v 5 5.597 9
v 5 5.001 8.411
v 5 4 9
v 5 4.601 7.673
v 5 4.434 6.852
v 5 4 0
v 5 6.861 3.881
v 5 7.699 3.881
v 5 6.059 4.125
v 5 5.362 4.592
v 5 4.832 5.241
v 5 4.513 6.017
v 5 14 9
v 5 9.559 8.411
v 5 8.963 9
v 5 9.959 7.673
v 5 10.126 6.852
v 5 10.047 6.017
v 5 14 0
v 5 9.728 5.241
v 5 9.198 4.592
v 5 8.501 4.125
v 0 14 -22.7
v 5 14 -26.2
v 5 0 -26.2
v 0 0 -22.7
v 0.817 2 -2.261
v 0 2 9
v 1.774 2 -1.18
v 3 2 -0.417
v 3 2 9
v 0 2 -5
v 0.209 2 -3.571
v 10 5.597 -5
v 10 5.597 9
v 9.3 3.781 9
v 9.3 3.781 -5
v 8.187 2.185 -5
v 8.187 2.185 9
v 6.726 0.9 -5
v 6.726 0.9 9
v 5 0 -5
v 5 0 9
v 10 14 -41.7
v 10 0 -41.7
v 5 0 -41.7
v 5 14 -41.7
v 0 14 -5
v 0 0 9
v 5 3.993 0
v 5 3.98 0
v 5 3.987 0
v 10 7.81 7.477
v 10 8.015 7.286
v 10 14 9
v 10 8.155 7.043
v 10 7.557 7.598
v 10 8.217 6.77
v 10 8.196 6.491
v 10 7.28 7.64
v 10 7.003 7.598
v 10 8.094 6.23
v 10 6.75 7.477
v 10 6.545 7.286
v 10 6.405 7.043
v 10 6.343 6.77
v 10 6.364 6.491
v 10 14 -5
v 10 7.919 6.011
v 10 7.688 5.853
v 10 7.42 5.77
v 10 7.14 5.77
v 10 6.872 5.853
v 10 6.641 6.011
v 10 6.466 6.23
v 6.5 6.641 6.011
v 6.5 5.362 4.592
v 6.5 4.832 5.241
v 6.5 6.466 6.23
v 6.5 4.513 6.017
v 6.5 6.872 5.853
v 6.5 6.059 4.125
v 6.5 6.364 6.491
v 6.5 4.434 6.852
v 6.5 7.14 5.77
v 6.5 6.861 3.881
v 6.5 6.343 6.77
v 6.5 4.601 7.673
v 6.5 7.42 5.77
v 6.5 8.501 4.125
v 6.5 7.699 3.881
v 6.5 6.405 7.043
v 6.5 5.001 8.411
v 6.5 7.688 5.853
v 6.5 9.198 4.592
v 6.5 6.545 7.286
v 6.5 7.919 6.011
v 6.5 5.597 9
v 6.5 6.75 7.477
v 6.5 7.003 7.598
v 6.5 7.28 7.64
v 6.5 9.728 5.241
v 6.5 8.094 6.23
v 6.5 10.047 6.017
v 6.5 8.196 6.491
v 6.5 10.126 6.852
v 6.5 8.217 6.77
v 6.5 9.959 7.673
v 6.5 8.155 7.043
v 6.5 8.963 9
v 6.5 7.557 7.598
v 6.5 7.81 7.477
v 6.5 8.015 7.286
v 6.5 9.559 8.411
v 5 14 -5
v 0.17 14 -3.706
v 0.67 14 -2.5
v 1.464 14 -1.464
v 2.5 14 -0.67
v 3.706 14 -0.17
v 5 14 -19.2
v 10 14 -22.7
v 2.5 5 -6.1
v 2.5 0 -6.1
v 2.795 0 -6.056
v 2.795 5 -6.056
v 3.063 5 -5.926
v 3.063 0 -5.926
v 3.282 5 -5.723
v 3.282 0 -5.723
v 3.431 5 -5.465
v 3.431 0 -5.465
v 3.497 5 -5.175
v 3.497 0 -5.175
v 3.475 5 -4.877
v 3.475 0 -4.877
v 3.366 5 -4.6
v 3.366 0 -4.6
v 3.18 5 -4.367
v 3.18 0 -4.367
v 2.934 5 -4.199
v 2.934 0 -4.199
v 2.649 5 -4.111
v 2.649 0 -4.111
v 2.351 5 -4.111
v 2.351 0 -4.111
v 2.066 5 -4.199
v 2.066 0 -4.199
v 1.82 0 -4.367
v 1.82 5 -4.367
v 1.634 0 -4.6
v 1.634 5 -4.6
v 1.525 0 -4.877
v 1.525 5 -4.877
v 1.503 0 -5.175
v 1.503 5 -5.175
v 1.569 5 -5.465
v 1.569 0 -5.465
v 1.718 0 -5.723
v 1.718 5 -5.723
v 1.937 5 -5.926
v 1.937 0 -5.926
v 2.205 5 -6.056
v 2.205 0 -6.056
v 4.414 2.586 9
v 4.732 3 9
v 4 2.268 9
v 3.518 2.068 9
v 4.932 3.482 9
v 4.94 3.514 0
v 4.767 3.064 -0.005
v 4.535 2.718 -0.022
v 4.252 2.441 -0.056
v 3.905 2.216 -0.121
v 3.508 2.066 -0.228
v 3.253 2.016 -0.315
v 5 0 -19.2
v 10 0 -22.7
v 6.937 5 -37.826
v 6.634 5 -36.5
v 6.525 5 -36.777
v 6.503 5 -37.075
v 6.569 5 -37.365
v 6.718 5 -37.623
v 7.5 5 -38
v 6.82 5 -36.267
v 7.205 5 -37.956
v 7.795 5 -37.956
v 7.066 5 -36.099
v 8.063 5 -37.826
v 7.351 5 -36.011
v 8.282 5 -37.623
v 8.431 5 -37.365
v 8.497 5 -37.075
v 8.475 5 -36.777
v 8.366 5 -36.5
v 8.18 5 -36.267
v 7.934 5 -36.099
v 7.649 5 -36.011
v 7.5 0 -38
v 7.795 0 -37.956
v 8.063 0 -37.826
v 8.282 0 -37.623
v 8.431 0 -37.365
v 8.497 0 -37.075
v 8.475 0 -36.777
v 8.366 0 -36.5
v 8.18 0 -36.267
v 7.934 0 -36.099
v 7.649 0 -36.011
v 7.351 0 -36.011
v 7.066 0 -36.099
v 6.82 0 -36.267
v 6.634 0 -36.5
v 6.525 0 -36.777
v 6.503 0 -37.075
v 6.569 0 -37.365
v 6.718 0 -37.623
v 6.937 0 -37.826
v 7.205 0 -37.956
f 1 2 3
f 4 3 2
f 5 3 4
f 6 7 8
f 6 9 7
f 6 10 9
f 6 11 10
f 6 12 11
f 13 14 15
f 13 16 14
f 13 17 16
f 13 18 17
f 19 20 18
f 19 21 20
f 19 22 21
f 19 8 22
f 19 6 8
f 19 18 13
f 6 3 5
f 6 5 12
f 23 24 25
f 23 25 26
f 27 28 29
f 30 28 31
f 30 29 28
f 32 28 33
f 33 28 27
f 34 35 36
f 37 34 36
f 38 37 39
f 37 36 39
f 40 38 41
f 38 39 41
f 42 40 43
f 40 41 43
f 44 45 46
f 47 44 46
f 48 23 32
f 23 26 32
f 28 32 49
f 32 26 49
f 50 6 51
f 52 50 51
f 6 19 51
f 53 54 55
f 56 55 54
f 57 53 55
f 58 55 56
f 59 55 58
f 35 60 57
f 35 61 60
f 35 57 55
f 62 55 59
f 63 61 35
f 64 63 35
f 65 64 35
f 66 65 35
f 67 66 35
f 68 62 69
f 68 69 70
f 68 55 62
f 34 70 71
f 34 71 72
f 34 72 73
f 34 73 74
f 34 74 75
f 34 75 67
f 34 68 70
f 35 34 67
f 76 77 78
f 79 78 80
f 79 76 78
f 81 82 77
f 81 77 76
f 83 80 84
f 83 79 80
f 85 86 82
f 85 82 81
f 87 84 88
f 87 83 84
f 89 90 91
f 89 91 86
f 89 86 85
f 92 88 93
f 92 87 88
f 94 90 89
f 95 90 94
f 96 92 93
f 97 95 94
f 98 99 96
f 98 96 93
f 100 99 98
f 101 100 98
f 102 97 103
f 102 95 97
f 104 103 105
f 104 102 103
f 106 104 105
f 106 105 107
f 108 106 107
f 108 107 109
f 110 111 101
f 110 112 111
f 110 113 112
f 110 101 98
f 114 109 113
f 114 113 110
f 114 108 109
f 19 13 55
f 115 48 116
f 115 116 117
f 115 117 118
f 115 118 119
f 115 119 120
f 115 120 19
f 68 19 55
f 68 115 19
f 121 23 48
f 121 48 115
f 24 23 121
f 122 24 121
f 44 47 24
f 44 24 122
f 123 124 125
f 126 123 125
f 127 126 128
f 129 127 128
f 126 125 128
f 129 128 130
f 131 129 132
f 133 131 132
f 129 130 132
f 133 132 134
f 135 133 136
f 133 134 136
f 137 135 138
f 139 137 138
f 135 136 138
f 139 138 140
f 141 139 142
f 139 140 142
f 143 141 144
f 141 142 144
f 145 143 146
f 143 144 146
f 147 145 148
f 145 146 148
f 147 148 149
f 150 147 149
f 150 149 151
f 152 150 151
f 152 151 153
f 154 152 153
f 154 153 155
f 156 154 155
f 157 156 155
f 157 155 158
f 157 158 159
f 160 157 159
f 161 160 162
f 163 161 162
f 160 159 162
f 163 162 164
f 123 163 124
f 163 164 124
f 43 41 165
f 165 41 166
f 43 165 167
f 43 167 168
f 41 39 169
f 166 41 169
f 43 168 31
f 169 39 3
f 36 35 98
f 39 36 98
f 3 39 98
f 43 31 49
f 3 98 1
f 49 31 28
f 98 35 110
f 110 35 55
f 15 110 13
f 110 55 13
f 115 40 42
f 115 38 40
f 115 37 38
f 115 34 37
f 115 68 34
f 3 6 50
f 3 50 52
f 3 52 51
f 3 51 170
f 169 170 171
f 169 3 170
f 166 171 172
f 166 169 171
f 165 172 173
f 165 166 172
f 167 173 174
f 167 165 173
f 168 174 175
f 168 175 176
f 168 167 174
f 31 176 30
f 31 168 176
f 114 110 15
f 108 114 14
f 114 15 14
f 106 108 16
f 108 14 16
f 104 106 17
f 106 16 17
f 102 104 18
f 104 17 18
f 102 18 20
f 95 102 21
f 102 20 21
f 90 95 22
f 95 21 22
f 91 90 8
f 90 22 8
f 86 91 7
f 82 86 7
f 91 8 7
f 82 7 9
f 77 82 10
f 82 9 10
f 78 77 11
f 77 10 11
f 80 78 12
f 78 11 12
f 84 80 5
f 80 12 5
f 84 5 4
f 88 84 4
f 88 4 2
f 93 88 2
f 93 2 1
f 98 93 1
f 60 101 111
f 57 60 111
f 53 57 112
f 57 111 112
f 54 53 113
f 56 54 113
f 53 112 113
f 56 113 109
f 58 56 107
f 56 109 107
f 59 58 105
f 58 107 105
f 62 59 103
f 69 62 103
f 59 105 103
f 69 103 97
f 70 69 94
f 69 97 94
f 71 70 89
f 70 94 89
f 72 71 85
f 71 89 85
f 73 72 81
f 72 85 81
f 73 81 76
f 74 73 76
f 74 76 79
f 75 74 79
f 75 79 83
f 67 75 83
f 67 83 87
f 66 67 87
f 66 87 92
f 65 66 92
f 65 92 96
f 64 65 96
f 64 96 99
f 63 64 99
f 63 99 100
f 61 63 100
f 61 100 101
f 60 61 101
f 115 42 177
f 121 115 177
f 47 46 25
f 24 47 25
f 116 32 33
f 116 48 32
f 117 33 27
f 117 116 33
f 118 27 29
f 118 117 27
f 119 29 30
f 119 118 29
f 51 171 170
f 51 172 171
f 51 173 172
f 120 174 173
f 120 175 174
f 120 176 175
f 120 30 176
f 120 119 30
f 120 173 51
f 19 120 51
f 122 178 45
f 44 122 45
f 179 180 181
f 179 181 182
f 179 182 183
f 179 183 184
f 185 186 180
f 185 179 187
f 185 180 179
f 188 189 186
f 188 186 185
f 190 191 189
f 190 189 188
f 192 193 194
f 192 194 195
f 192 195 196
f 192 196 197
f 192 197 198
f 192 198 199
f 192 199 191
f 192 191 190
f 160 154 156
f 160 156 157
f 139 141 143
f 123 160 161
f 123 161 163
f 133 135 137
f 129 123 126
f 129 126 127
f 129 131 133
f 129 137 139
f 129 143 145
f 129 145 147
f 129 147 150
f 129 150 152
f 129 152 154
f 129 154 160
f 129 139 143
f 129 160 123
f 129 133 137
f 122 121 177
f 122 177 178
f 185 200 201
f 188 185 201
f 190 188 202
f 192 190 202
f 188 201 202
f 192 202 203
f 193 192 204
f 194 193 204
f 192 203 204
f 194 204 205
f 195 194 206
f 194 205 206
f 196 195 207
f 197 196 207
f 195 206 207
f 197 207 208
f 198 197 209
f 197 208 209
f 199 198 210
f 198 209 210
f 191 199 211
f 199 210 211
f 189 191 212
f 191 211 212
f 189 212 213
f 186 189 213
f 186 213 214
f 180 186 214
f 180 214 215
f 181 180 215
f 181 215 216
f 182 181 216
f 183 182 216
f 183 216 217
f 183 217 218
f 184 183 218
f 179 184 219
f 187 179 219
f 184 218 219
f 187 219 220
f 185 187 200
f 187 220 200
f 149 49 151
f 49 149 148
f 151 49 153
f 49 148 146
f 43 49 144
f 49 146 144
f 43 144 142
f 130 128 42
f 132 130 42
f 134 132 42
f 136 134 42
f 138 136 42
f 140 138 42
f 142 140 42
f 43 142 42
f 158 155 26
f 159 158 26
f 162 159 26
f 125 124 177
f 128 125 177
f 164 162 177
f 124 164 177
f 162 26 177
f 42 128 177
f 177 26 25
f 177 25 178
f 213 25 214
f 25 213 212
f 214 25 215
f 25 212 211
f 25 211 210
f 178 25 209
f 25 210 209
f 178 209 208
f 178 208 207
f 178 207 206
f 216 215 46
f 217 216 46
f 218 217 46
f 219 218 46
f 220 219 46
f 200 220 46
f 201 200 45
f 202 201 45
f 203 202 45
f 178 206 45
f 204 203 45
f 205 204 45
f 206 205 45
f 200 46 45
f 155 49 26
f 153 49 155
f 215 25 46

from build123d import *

# Parameters (mm, degrees)
SALIENTE_EXTRUIR1_DEPTH      = 14
SALIENTE_EXTRUIR3_DEPTH      = 9
SALIENTE_EXTRUIR3_DEPTH_BACK = 5
CROQUIS5_R                   = 2.85
CORTAR_EXTRUIR3_DEPTH        = 6.5
CORTAR_EXTRUIR4_DEPTH        = 21
CROQUIS7_R                   = 1
CORTAR_EXTRUIR5_DEPTH        = 5
CROQUIS8_R                   = 0.94
CORTAR_EXTRUIR6_DEPTH        = 45.465042449
REDONDEO2_R                  = 5
REDONDEO3_R                  = 2


with BuildPart() as part:
    # Croquis1 → Saliente-Extruir1 (new body)
    with BuildSketch(Plane(origin=(0, 0, 0), x_dir=(1, 0, 0), z_dir=(0, 1, 0))):
        Polygon((0, 0), (5, 0), (5, 19.2), (10, 22.7), (10, 41.7), (5, 41.7), (5, 26.2), (0, 22.7), align=None)
    extrude(amount=SALIENTE_EXTRUIR1_DEPTH)

    # Croquis2 → Saliente-Extruir3 (add, two sides: drawn at the far end of the back side and taken through both)
    with BuildSketch(Plane.XY.offset(-SALIENTE_EXTRUIR3_DEPTH_BACK)):
        Polygon((0, 0), (0, 2), (5, 2), (5, 14), (10, 14), (10, 0), align=None)
    extrude(amount=SALIENTE_EXTRUIR3_DEPTH + SALIENTE_EXTRUIR3_DEPTH_BACK)

    # Croquis5 → Cortar-Extruir3 (cut)
    with BuildSketch(Plane.ZY):
        with Locations((6.7, 7.28)):
            Circle(CROQUIS5_R)
    extrude(amount=-CORTAR_EXTRUIR3_DEPTH, mode=Mode.SUBTRACT)

    # Croquis6 → Cortar-Extruir4 (cut)
    with BuildSketch(Plane.XY.offset(9)):
        with BuildLine():
            Line((5, 0), (10, 0))
            Line((10, 0), (10, 5.596996732))
            ThreePointArc((10, 5.596996732), (8.187050213, 2.184731514), (5, 0))
        make_face()
    extrude(amount=-CORTAR_EXTRUIR4_DEPTH, mode=Mode.SUBTRACT)

    # Croquis7 → Cortar-Extruir5 (cut)
    with BuildSketch(Plane.XZ):
        with Locations(Location((7.5, -37, 0), (0, 0, 270))):
            Circle(CROQUIS7_R)
        with Locations(Location((2.5, -5.1, 0), (0, 0, 270))):
            Circle(CROQUIS7_R)
    extrude(amount=-CORTAR_EXTRUIR5_DEPTH, mode=Mode.SUBTRACT)

    # Croquis8 → Cortar-Extruir6 (cut, through all)
    with BuildSketch(Plane.ZY.offset(-6.5)):
        with Locations((6.7, 7.28)):
            Circle(CROQUIS8_R)
    extrude(amount=-CORTAR_EXTRUIR6_DEPTH, mode=Mode.SUBTRACT)

    # Redondeo2
    redondeo2_edges = [part.edges().sort_by_distance(p)[0] for p in [
        (0, 8, 0),
    ]]
    fillet(redondeo2_edges, radius=REDONDEO2_R - 0.0001)  # a hair under: the kernel refuses the full size

    # Redondeo3
    redondeo3_edges = [part.edges().sort_by_distance(p)[0] for p in [
        (5, 2, 4.5),
    ]]
    fillet(redondeo3_edges, radius=REDONDEO3_R)


solid = part.part
